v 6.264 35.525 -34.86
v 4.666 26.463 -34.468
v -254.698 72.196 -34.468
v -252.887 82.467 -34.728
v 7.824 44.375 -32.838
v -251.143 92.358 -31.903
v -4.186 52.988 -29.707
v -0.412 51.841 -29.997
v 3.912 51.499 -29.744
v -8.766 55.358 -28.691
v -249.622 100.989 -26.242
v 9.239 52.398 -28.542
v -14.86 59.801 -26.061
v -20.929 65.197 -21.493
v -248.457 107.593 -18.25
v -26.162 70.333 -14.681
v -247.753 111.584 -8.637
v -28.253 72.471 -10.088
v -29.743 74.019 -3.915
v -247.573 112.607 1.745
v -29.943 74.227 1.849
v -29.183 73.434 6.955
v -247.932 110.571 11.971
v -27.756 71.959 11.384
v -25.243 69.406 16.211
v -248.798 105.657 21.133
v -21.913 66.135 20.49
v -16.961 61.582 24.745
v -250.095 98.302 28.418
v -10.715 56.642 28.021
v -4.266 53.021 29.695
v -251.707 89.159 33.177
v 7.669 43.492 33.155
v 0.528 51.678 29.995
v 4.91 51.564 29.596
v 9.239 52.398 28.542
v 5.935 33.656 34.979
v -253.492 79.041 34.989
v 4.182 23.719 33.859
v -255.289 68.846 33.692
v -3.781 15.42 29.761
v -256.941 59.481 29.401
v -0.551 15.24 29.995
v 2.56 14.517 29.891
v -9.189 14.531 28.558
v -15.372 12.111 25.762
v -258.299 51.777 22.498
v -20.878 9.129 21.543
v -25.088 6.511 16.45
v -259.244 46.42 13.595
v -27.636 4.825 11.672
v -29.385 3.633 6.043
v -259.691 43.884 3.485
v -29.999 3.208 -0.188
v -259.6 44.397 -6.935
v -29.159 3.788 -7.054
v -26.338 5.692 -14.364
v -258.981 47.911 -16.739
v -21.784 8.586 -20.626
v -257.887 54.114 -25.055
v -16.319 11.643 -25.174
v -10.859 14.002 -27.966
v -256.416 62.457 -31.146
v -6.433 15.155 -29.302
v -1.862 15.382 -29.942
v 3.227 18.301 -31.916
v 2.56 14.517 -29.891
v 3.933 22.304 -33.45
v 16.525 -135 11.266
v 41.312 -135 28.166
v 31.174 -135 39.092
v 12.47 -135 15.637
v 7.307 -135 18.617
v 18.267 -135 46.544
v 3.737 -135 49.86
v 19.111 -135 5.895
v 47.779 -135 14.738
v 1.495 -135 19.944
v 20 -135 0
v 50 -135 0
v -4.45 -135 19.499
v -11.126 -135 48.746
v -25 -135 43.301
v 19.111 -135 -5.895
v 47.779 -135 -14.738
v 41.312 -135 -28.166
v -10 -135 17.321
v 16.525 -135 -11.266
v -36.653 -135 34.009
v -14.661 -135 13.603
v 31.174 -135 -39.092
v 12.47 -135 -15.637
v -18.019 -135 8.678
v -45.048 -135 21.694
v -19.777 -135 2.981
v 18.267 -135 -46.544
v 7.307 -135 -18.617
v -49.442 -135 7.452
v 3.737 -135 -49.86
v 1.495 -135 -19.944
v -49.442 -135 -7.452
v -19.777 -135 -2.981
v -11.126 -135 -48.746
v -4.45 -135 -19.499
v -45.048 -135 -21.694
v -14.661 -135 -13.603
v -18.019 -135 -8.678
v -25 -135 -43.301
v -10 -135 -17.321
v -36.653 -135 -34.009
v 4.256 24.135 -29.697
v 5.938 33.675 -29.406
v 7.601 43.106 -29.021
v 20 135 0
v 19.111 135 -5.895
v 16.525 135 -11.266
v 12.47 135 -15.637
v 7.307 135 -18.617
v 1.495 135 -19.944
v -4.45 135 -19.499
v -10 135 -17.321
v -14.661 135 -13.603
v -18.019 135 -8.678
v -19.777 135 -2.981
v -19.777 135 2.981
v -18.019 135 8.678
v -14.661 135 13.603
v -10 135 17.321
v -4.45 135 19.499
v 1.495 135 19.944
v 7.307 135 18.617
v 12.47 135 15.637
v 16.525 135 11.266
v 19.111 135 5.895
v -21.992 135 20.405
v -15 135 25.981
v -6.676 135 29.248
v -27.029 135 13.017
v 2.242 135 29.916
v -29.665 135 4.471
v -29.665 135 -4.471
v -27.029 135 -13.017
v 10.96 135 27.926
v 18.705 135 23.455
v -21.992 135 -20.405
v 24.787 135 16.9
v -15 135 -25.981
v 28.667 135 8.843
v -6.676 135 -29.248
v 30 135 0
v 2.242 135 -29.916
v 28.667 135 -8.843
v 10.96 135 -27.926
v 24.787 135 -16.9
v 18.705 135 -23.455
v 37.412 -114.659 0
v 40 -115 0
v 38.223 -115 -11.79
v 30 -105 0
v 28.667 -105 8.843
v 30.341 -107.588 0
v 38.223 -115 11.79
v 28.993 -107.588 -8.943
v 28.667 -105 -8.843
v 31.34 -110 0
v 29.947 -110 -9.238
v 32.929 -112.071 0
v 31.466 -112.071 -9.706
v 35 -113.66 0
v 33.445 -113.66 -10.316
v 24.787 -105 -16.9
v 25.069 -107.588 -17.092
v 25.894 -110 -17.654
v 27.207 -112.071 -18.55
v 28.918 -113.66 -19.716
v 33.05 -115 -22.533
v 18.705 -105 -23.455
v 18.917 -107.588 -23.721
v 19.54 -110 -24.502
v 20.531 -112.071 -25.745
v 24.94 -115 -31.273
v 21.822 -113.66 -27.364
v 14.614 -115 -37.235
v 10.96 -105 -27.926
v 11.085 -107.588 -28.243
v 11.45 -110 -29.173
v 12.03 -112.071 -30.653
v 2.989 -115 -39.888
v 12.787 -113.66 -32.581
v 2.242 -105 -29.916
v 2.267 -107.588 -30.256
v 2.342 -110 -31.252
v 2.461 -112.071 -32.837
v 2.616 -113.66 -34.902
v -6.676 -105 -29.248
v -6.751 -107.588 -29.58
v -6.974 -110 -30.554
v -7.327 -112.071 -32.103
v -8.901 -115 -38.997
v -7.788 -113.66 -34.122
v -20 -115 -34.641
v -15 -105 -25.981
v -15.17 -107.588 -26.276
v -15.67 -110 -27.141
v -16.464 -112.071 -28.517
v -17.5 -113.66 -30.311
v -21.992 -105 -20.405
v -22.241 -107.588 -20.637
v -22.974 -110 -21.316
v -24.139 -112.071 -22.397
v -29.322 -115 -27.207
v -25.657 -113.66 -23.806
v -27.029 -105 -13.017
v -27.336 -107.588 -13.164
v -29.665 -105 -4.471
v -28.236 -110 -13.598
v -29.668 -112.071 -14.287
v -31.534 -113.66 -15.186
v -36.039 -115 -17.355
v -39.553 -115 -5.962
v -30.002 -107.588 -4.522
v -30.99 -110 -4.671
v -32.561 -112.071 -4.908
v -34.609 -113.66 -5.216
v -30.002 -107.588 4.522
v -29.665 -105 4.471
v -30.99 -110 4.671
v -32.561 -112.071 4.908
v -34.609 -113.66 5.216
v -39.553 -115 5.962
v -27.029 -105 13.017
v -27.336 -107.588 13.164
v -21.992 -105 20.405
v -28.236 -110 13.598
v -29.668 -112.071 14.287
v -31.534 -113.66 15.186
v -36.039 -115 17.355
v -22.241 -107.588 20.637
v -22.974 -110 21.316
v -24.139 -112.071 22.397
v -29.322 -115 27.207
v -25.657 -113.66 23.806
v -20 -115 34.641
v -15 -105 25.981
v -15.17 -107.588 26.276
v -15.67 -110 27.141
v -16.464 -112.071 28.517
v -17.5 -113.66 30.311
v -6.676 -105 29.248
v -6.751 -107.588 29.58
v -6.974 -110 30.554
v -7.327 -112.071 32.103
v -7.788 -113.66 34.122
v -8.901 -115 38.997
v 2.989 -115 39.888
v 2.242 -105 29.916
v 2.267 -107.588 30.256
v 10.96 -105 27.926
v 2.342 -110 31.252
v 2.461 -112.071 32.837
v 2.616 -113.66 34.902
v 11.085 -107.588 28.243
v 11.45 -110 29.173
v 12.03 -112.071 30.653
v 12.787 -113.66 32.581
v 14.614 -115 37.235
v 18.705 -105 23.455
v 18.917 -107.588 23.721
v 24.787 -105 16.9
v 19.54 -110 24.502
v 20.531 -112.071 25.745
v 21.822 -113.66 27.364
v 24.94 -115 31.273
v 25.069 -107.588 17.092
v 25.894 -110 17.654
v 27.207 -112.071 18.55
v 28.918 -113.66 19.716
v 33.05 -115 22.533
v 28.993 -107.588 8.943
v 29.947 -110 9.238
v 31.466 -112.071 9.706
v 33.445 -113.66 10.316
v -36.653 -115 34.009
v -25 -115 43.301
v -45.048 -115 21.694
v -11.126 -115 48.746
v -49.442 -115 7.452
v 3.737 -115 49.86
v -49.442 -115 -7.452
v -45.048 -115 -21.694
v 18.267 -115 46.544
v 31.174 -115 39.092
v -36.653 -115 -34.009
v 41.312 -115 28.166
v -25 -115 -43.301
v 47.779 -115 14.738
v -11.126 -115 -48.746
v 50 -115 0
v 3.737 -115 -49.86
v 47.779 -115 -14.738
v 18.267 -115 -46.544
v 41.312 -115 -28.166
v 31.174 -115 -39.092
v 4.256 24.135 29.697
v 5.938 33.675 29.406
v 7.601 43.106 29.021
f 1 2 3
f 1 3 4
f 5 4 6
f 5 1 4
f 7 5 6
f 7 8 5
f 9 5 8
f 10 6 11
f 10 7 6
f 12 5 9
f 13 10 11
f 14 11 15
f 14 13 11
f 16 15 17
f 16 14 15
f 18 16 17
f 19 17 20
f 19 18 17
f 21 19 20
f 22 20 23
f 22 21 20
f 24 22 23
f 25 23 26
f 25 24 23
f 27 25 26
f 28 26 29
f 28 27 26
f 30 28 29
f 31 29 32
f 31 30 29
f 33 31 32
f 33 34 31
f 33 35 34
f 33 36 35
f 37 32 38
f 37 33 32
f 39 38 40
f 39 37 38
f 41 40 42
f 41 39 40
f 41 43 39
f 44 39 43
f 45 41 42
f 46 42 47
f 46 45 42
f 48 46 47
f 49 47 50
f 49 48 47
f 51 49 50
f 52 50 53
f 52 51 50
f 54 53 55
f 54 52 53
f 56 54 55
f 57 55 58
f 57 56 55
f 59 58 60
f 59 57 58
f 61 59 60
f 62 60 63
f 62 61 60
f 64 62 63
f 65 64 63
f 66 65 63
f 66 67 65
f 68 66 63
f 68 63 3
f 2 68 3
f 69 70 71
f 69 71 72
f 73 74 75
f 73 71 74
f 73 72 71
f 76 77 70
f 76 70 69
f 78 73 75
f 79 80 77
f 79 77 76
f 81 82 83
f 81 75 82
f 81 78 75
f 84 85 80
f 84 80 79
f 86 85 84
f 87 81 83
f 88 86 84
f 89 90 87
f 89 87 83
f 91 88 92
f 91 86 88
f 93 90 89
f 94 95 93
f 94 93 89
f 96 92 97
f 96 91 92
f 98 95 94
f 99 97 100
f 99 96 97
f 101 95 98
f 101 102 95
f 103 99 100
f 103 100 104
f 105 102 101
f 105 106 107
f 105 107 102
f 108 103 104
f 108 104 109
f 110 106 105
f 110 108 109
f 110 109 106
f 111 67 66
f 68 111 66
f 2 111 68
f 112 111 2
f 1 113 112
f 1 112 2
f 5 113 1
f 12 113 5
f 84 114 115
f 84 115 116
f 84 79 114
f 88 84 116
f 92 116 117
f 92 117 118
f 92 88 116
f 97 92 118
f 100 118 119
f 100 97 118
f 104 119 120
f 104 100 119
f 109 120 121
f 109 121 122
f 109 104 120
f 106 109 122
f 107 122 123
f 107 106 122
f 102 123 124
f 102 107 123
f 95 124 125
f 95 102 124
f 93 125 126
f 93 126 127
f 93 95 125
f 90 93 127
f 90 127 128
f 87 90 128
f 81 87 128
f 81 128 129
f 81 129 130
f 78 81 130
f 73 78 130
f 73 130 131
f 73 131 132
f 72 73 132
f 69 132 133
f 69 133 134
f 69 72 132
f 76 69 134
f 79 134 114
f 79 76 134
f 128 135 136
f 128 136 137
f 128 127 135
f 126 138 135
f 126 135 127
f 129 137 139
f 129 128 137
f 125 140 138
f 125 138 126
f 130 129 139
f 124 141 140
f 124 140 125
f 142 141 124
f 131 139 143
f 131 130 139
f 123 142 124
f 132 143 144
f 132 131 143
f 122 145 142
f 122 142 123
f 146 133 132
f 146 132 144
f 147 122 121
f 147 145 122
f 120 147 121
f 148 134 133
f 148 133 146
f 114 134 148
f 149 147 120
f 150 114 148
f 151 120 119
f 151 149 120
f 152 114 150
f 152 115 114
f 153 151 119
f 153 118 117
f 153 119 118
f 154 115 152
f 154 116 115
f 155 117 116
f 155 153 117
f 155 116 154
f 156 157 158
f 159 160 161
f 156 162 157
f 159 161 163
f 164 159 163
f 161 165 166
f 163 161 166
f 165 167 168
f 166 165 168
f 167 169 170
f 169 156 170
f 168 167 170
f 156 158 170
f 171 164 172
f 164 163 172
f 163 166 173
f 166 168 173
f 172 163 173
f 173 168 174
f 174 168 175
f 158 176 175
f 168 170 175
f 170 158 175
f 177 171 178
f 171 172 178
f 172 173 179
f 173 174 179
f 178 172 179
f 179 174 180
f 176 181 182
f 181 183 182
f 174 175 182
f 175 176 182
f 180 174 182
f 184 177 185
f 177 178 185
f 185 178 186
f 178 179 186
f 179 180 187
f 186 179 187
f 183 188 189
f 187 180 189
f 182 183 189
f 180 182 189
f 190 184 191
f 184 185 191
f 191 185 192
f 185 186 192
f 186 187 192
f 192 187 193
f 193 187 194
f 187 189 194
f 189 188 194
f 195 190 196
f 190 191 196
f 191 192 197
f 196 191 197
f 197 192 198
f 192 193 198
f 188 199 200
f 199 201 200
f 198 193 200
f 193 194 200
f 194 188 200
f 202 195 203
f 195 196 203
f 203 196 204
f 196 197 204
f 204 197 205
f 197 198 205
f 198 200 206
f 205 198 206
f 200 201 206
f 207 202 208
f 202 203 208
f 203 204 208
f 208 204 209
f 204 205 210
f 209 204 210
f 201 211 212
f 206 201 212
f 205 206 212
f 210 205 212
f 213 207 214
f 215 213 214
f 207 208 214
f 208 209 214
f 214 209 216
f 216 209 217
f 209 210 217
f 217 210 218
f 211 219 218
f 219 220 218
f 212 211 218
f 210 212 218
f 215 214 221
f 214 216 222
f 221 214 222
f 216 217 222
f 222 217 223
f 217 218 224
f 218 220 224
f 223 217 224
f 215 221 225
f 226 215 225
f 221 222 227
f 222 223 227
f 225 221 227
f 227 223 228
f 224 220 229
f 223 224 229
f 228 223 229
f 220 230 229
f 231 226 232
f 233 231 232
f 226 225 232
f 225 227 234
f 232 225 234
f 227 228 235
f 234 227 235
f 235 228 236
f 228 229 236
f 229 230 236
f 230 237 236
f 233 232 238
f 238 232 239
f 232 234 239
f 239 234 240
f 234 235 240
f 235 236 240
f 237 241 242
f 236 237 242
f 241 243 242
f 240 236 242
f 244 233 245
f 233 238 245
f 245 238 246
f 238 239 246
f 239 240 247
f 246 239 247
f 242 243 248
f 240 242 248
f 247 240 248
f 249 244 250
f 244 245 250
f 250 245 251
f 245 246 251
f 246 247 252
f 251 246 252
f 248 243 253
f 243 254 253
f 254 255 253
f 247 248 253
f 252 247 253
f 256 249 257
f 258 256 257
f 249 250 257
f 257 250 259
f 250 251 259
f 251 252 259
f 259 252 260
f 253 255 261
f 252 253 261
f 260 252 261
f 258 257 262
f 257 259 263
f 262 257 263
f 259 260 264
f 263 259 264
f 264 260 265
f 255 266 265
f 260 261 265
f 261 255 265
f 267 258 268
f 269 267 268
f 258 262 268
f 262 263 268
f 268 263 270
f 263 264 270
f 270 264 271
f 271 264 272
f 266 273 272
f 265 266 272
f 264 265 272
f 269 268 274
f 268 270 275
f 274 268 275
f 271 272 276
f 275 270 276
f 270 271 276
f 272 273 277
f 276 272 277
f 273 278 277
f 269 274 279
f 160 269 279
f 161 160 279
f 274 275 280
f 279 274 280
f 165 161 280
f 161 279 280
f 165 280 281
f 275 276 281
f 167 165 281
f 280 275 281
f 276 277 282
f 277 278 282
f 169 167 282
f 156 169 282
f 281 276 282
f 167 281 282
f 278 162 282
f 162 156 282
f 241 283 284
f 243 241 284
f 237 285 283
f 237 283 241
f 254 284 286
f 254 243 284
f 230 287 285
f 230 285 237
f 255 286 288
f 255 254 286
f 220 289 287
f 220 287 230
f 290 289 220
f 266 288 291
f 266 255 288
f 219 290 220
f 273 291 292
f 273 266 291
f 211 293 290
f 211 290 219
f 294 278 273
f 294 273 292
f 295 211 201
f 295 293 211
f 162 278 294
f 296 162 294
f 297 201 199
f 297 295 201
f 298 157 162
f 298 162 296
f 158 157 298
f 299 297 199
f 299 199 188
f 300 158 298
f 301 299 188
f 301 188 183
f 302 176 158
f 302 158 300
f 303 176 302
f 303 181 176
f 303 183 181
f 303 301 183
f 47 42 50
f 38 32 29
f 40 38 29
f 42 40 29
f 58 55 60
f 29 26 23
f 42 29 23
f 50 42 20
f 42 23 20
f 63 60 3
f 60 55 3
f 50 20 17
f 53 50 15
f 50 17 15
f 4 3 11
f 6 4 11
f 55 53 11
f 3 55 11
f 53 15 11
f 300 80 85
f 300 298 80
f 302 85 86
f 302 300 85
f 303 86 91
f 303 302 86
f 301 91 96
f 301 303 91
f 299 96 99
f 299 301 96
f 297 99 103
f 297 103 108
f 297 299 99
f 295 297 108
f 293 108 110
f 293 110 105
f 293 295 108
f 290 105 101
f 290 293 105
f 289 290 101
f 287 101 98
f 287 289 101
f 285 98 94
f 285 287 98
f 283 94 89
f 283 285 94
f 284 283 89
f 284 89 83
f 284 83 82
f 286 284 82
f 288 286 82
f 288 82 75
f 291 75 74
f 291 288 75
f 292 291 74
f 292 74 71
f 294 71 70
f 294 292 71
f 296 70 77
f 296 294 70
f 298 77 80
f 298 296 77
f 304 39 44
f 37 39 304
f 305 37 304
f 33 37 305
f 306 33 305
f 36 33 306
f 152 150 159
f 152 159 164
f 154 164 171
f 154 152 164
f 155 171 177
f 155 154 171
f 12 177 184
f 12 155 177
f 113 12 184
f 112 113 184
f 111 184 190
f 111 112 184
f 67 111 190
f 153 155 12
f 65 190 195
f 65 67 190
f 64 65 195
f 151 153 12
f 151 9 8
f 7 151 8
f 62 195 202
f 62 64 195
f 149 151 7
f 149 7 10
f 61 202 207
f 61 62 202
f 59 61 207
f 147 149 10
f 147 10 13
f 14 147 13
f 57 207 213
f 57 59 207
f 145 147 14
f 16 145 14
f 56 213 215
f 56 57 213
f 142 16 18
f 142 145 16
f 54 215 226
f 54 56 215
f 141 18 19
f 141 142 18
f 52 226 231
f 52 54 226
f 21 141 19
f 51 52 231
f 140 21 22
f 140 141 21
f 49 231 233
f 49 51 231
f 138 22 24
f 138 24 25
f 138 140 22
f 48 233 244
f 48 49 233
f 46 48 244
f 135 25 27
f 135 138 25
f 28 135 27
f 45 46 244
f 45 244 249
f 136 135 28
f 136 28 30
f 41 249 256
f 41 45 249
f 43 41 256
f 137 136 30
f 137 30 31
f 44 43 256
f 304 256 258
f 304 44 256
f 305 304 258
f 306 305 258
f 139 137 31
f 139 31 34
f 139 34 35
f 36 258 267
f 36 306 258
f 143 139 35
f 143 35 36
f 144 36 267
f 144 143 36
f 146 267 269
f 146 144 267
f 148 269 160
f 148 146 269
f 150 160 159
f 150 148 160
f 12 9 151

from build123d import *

# Parameters (mm, degrees)
SKETCH11_R          = 35
BOSS_EXTRUDE2_DEPTH = 263.365760626
FILLET2_R           = 10
SKETCH15_R          = 20
CUT_EXTRUDE1_DEPTH  = 378.961489357


with BuildPart() as part:
    # Sketch14 → Revolve3 (revolve)
    with BuildSketch(Plane.XY):
        Polygon((30, -115), (30, 135), (20, 135), (20, -135), (50, -135), (50, -115), align=None)
    revolve(axis=Axis((0, -135, 0), (0, 1, 0)))

    # Sketch11 → Boss-Extrude2 (add)
    with BuildSketch(Plane(origin=(0.069700253, 0.395289776, -0.070775492), x_dir=(-0.03015368960704645, -0.17101007166283763, -0.9848077530122075), z_dir=(0.984807753012208, -0.17364817766693072, 0))):
        with Locations((-5.721541908, 32.04089679)):
            Circle(SKETCH11_R)
    extrude(amount=-BOSS_EXTRUDE2_DEPTH)

    # Fillet2
    fillet2_edges = [part.edges().sort_by_distance(p)[0] for p in [
        (-30, -115, 0),
    ]]
    fillet(fillet2_edges, radius=FILLET2_R)

    # Sketch15 → Cut-Extrude1 (cut, through all)
    with BuildSketch(Plane(origin=(0, 135, 0), x_dir=(1, 0, 0), z_dir=(0, 1, 0))):
        Circle(SKETCH15_R)
    extrude(amount=-CUT_EXTRUDE1_DEPTH, mode=Mode.SUBTRACT)


solid = part.part
